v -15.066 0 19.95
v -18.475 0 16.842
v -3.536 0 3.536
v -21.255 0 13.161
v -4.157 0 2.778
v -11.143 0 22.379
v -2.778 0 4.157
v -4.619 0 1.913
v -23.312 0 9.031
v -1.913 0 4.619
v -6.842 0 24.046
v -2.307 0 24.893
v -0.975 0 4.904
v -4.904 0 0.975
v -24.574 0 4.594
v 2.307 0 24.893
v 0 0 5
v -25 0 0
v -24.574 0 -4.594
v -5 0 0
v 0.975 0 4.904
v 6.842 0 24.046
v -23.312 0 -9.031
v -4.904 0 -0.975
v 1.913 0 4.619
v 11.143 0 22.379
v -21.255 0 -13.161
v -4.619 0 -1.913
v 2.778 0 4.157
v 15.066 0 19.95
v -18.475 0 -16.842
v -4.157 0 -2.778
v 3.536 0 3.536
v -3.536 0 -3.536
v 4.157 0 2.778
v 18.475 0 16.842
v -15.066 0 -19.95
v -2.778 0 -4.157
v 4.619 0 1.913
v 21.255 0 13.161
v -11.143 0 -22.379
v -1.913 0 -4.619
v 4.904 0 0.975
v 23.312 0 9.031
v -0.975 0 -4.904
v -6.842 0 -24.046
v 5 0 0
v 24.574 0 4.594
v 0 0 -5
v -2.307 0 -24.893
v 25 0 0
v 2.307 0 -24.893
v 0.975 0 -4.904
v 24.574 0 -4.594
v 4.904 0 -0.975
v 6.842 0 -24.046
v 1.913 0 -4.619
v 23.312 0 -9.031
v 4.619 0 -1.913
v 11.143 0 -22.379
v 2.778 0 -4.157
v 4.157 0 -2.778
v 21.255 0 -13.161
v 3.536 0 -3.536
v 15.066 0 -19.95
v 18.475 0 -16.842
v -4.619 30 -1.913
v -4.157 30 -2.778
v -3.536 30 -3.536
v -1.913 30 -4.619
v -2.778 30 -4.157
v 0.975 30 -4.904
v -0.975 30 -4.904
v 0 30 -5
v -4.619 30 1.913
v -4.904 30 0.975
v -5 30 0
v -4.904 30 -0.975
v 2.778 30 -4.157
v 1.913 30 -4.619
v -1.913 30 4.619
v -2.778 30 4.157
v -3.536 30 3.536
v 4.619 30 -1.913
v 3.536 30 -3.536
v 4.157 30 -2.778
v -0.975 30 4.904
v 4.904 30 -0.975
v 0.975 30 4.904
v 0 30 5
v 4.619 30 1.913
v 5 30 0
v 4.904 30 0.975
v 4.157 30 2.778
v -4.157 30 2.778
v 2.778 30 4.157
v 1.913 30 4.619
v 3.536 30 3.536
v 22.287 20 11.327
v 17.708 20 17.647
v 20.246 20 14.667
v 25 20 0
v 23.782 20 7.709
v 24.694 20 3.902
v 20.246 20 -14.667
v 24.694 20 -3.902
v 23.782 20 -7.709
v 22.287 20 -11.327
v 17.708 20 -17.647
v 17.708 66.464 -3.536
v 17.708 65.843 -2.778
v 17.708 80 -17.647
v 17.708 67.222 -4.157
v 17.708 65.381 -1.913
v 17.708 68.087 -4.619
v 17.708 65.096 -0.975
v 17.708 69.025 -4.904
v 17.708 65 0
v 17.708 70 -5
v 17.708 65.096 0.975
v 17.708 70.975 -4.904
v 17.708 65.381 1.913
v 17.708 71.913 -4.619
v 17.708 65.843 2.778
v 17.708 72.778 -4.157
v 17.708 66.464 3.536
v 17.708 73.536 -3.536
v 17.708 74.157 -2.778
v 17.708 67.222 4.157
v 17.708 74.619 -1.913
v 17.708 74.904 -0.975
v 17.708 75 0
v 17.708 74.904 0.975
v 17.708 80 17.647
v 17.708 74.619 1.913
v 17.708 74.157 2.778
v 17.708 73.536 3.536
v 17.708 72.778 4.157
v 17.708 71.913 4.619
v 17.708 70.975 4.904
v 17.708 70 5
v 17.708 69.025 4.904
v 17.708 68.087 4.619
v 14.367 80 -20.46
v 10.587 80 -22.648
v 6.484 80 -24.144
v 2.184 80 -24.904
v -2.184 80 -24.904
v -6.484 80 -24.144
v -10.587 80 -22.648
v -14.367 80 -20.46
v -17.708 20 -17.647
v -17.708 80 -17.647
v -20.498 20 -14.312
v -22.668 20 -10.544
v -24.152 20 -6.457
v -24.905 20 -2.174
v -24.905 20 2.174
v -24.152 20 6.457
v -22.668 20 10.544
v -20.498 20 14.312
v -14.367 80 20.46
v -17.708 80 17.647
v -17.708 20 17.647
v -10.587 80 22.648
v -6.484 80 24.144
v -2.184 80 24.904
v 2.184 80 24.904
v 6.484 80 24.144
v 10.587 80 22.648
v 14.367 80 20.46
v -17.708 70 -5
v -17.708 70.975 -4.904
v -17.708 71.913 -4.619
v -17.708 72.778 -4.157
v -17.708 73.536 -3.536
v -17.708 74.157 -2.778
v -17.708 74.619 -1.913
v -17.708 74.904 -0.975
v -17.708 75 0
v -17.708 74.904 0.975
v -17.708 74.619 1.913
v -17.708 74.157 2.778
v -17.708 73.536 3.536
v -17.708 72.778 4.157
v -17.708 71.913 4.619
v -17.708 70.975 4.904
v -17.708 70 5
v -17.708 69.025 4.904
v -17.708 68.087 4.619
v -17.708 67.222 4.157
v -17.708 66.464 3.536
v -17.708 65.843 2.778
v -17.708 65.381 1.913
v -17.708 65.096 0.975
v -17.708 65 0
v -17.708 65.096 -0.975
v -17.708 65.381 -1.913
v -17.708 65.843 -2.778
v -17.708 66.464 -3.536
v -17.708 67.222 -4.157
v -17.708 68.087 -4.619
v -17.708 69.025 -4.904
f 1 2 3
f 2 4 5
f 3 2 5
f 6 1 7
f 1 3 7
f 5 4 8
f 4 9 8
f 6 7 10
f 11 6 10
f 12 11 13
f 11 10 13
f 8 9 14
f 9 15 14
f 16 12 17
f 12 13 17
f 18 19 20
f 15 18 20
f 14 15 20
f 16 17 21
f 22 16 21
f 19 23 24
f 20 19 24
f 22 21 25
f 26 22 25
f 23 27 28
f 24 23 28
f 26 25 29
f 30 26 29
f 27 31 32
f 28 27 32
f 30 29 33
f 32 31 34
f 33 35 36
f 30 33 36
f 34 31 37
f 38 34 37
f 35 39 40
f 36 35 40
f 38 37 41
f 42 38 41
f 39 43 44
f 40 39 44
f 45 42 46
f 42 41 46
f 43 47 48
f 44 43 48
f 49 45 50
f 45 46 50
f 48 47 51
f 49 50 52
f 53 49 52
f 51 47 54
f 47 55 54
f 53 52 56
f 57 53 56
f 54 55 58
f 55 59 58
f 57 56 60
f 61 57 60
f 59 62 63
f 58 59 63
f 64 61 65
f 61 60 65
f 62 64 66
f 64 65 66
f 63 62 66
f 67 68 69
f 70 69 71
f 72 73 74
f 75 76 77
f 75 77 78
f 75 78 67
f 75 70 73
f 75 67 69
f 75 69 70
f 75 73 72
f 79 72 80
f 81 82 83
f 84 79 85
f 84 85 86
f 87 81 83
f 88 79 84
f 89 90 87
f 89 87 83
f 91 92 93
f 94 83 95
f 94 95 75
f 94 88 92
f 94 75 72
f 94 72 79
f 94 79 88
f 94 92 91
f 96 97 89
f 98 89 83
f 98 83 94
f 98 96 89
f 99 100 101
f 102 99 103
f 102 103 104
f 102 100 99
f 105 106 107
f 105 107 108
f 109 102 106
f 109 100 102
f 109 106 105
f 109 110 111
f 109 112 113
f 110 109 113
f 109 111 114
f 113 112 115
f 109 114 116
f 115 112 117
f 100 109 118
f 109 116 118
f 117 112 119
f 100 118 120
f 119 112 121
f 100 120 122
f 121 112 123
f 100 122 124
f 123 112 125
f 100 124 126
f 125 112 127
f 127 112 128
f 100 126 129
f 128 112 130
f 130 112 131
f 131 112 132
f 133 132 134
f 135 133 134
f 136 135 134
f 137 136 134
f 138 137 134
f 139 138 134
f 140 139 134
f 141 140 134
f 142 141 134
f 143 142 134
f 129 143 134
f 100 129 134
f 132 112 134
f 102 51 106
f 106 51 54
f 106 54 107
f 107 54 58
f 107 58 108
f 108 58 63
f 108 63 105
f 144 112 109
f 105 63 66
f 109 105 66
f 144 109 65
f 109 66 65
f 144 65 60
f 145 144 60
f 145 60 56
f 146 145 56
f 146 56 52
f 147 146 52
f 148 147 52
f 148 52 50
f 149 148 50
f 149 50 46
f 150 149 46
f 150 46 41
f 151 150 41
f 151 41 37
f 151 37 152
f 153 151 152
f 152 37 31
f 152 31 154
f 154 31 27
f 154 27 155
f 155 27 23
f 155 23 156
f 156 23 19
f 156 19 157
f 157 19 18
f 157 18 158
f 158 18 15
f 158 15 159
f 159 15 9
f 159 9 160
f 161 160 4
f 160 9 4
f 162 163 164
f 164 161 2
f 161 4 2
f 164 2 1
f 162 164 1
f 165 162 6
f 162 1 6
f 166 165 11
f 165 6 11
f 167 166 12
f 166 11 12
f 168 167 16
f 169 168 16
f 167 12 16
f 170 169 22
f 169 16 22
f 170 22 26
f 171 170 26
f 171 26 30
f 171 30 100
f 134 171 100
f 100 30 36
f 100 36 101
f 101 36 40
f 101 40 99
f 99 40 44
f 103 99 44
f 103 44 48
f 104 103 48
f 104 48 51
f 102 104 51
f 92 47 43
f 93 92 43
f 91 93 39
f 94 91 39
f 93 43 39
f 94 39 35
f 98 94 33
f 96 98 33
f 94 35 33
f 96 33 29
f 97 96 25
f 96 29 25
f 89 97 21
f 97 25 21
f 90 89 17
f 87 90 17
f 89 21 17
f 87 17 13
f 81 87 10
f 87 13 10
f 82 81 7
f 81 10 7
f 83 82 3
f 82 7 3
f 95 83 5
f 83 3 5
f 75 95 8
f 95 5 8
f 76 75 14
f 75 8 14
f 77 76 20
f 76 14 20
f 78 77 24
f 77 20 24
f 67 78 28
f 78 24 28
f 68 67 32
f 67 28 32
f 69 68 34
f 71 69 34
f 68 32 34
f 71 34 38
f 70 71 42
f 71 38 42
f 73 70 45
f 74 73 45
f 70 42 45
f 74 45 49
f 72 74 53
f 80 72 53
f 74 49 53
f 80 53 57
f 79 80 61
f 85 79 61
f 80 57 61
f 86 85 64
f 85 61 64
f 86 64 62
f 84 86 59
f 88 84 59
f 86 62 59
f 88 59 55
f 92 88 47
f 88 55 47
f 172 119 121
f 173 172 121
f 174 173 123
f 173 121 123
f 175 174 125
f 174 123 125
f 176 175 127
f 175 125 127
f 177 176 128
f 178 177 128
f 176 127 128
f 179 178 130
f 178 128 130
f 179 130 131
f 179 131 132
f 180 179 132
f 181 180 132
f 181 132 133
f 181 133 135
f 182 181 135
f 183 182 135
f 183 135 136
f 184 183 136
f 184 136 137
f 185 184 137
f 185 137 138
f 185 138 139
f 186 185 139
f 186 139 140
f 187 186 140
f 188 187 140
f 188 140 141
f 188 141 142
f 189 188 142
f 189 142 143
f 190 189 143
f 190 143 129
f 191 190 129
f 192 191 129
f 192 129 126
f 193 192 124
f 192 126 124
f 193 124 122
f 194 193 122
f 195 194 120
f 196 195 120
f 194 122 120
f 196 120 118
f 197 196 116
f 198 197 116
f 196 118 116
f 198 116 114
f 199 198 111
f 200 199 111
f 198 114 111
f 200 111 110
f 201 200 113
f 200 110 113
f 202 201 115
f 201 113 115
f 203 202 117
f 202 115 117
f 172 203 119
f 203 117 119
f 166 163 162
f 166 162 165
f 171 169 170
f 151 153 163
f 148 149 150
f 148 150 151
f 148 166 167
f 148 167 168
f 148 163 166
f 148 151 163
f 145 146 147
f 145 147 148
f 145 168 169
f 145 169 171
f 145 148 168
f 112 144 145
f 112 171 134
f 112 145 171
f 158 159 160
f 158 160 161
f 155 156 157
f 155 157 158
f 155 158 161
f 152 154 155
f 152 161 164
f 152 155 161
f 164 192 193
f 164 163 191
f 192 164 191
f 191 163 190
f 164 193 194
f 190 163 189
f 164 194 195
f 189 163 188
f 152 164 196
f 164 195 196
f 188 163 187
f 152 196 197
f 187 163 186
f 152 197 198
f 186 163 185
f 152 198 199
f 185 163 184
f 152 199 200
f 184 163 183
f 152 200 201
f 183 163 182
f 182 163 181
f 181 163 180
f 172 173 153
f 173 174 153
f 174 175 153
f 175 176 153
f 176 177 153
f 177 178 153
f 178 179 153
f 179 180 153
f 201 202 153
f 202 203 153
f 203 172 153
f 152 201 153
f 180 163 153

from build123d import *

# Parameters (mm, degrees)
SKETCH1_R           = 25
BOSS_EXTRUDE1_DEPTH = 80
CUT_EXTRUDE1_DEPTH  = 60
SKETCH3_R           = 5
CUT_EXTRUDE2_DEPTH  = 60
SKETCH4_R           = 5
CUT_EXTRUDE3_DEPTH  = 30


with BuildPart() as part:
    # Sketch1 → Boss-Extrude1 (new body)
    with BuildSketch(Plane(origin=(0, 0, 0), x_dir=(1, 0, 0), z_dir=(0, 1, 0))):
        Circle(SKETCH1_R)
    extrude(amount=BOSS_EXTRUDE1_DEPTH)

    # Sketch2 → Cut-Extrude1 (cut)
    with BuildSketch(Plane(origin=(0, 80, 0), x_dir=(1, 0, 0), z_dir=(0, 1, 0))):
        with BuildLine():
            Line((-17.708192822, -17.647093443), (-17.708192822, 17.647093443))
            ThreePointArc((-17.708192822, 17.647093443), (-25, 0), (-17.708192822, -17.647093443))
        make_face()
        with BuildLine():
            ThreePointArc((25, 0), (23.10524638, 9.547124684), (17.708192822, 17.647093443))
            Line((17.708192822, 17.647093443), (17.708192822, -17.647093443))
            ThreePointArc((17.708192822, -17.647093443), (23.10524638, -9.547124684), (25, 0))
        make_face()
    extrude(amount=-CUT_EXTRUDE1_DEPTH, mode=Mode.SUBTRACT)

    # Sketch3 → Cut-Extrude2 (cut)
    with BuildSketch(Plane(origin=(17.708192822, 0, 0), x_dir=(0, 0, -1), z_dir=(1, 0, 0))):
        with Locations((0, 70)):
            Circle(SKETCH3_R)
    extrude(amount=-CUT_EXTRUDE2_DEPTH, mode=Mode.SUBTRACT)

    # Sketch4 → Cut-Extrude3 (cut)
    with BuildSketch(Plane.XZ):
        Circle(SKETCH4_R)
    extrude(amount=-CUT_EXTRUDE3_DEPTH, mode=Mode.SUBTRACT)


solid = part.part
